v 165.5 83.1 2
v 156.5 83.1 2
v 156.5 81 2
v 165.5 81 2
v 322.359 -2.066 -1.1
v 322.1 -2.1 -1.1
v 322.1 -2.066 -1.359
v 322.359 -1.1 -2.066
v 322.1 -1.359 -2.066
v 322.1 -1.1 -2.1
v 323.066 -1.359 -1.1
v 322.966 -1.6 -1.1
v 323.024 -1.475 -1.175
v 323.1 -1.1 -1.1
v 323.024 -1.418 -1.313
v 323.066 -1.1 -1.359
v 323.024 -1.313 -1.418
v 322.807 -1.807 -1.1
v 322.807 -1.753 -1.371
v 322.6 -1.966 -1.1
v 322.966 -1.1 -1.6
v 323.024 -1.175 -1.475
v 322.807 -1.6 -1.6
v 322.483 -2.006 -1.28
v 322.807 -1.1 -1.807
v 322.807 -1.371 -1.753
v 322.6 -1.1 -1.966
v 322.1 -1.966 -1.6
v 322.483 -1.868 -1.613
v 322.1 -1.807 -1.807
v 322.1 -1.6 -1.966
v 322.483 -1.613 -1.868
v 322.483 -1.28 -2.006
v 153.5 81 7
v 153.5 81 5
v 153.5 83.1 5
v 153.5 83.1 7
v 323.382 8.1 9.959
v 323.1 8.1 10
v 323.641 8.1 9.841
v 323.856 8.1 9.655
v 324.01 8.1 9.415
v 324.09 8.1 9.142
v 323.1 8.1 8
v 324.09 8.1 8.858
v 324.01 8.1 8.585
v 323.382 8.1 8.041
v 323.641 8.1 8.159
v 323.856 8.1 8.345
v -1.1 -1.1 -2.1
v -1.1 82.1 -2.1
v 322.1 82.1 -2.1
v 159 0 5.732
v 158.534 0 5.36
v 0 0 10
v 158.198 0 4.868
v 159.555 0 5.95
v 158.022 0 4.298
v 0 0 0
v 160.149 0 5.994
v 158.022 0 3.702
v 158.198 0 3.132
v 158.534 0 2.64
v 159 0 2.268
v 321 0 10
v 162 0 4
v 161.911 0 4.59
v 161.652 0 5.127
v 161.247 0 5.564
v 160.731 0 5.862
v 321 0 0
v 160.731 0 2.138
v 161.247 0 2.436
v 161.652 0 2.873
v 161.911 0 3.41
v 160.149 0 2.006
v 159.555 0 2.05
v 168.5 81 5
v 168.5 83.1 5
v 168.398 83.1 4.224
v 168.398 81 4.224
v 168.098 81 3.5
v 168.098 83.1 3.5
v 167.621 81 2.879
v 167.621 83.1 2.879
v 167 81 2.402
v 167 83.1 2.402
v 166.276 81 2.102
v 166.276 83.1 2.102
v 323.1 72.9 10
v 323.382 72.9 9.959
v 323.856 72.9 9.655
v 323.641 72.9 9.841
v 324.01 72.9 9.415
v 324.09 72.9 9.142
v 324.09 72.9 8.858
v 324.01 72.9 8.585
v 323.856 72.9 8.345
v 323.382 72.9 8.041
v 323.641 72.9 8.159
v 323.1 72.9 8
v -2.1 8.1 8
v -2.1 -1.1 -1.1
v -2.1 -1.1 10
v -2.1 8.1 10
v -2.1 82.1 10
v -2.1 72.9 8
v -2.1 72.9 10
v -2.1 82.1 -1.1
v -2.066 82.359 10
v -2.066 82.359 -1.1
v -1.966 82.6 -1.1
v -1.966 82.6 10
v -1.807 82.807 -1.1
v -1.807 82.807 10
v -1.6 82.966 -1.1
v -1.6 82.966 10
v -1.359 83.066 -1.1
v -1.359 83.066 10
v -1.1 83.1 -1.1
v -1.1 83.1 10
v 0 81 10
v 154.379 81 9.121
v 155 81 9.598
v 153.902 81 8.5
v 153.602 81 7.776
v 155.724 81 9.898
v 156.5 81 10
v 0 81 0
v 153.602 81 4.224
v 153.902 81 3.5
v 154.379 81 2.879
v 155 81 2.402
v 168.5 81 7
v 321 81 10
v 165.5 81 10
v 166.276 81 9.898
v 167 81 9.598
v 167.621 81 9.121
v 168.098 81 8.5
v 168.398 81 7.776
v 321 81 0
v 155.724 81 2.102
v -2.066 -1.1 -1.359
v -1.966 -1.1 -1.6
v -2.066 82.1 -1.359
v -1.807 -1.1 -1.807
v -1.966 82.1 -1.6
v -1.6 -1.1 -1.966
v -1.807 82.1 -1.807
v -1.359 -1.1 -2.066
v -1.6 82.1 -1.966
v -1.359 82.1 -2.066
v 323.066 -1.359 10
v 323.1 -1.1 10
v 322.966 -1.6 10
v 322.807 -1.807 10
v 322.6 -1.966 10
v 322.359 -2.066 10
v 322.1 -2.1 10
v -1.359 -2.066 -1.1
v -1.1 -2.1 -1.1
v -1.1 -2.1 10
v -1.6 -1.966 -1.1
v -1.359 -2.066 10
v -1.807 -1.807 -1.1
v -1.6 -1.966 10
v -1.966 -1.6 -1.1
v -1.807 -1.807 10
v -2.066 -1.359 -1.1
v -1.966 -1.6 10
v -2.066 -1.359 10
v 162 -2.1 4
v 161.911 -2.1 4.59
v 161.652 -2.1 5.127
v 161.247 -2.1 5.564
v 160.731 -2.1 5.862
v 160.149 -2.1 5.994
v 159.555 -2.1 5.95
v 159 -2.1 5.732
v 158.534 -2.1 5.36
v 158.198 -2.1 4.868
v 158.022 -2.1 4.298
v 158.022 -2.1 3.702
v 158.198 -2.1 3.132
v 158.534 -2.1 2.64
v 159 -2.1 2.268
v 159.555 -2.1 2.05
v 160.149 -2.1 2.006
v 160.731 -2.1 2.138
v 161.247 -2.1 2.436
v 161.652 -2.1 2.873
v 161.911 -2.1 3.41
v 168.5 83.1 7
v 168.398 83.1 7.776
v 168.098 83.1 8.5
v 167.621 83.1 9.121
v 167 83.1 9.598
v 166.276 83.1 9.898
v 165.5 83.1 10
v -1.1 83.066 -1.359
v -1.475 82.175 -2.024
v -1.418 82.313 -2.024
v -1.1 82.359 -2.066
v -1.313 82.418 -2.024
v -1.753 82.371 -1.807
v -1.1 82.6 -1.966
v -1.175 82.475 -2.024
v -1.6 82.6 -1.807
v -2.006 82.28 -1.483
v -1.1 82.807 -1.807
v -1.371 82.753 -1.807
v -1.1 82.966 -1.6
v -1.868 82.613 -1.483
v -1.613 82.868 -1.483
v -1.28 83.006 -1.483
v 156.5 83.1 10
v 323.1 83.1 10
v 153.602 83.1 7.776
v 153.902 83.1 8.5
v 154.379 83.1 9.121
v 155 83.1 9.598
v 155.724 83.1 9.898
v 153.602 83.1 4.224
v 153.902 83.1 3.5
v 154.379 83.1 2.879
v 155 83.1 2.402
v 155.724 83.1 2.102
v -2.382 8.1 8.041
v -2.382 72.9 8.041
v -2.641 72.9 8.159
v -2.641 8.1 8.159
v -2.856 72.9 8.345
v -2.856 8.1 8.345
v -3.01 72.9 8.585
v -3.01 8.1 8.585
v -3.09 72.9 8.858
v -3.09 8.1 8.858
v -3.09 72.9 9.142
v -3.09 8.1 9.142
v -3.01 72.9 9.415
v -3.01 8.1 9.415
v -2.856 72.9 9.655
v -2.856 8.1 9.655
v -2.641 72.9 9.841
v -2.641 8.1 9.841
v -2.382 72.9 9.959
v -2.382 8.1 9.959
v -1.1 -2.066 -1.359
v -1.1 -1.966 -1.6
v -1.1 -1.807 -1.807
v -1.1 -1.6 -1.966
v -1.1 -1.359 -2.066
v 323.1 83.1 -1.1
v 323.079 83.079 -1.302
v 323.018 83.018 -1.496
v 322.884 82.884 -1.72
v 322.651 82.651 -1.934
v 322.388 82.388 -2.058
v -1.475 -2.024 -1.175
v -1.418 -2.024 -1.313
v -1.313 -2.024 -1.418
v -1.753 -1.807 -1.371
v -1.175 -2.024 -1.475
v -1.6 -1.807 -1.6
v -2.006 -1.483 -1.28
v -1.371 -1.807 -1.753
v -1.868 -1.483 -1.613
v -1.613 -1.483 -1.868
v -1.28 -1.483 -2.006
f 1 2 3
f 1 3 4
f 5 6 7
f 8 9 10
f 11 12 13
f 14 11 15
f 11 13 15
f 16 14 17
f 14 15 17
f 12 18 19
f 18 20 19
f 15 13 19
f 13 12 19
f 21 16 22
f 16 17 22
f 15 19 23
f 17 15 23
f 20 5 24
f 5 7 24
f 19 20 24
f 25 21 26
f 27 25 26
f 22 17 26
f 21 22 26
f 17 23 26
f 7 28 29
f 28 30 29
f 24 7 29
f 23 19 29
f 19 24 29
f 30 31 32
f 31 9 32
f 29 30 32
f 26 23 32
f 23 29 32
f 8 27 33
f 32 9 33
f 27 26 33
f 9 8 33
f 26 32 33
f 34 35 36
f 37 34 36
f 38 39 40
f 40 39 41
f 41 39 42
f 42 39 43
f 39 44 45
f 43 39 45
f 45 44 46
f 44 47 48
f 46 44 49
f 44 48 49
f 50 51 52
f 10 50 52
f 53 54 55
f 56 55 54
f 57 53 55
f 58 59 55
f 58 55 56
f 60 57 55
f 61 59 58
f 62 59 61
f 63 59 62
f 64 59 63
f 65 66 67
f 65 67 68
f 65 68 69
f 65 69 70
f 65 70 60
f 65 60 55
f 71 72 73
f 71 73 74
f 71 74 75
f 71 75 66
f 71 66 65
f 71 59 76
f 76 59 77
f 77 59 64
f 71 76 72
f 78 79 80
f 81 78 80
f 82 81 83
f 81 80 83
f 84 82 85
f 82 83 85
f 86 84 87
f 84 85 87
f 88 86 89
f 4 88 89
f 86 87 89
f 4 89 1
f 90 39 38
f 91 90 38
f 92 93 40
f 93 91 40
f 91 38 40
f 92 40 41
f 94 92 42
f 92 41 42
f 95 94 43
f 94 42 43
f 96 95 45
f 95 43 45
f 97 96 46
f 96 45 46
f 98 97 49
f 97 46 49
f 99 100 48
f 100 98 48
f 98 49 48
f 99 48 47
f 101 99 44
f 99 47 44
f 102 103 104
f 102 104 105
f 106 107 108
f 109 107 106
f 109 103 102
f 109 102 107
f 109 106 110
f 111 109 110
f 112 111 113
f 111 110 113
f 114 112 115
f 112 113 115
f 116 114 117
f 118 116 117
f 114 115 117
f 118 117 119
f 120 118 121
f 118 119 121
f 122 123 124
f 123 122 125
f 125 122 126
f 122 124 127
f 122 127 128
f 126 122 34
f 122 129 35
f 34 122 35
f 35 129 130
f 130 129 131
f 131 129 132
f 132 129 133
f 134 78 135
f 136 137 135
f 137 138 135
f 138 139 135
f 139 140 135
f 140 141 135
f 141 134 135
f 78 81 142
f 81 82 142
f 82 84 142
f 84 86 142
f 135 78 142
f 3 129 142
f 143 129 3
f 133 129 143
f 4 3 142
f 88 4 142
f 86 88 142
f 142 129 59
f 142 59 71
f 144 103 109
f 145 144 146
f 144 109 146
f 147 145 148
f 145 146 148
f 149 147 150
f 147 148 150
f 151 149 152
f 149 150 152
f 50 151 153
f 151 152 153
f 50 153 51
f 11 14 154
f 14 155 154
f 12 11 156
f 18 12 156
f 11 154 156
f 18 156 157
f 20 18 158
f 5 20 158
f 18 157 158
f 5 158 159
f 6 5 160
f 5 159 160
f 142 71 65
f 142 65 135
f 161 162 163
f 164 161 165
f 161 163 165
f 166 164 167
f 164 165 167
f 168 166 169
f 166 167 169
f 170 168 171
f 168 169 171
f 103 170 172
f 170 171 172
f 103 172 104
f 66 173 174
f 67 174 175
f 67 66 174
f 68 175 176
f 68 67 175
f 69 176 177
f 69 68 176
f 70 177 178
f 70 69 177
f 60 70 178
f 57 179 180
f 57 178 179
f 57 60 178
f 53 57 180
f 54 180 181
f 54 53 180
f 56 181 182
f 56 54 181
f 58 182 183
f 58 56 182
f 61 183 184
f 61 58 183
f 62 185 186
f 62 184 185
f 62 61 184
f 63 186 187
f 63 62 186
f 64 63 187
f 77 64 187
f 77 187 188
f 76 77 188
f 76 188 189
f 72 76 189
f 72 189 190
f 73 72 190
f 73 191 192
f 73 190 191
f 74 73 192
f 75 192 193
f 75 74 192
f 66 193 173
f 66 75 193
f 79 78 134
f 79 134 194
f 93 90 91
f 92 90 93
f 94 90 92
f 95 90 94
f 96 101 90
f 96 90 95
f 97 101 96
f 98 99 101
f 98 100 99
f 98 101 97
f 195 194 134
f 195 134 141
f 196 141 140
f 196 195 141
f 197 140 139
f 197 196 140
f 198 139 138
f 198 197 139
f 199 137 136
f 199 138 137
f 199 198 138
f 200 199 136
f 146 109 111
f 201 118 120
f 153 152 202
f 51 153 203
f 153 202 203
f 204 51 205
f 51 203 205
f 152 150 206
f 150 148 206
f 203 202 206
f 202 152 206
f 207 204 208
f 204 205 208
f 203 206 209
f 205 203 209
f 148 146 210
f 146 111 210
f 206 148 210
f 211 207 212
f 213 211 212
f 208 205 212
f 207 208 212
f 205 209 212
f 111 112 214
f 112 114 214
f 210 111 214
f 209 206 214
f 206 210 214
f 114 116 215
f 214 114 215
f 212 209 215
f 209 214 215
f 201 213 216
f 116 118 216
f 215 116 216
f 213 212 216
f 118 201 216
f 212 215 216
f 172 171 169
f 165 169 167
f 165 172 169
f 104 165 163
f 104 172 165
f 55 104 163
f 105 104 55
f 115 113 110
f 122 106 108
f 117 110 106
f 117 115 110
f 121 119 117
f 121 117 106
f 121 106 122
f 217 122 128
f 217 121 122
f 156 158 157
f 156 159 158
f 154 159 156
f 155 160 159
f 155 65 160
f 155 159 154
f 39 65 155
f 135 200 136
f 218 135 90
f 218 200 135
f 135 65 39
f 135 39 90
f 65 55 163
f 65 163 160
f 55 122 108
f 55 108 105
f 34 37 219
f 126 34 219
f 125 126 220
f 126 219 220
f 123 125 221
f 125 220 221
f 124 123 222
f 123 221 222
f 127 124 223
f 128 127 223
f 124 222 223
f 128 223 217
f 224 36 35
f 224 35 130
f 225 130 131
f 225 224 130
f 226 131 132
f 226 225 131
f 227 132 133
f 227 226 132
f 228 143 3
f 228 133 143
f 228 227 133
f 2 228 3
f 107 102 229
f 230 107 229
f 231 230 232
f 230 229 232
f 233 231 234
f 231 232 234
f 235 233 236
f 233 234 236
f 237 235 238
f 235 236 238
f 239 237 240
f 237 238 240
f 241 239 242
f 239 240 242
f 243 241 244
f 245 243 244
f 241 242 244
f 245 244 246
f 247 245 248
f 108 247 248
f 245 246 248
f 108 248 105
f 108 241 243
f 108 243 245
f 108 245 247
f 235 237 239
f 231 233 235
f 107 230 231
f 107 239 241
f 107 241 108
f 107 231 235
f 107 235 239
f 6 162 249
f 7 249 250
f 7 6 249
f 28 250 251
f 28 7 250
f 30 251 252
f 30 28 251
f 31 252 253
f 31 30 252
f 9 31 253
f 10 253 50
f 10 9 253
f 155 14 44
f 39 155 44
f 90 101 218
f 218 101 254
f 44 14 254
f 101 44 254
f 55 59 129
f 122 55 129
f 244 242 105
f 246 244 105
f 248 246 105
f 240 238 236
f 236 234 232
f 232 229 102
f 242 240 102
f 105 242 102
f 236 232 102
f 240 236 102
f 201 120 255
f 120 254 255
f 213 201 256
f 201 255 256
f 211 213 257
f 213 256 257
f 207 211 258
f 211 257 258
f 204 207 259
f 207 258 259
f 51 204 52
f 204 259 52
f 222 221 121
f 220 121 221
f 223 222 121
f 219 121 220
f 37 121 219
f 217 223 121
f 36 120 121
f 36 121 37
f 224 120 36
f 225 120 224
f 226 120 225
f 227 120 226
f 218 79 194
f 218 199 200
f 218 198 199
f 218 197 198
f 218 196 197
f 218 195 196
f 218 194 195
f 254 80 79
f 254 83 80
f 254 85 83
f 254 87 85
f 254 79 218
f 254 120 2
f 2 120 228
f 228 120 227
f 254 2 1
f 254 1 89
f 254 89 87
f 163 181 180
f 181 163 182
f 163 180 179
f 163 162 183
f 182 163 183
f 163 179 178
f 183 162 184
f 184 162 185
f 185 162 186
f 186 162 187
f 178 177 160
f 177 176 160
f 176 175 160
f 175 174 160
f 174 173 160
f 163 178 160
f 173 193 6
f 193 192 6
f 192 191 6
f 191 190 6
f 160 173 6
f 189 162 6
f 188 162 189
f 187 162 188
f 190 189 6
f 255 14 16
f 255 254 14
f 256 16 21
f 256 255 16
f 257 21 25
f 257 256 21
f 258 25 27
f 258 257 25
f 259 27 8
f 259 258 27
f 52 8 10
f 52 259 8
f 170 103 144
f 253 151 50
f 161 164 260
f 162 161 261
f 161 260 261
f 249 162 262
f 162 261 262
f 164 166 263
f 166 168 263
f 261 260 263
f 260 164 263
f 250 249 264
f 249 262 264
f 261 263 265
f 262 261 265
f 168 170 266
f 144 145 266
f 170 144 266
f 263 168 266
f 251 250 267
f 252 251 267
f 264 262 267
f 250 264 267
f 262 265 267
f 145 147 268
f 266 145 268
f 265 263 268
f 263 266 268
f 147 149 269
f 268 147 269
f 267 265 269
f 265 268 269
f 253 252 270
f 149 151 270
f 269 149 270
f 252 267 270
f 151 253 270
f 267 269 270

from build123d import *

# Parameters (mm, degrees)
CYLINDER_R         = 2
CYLINDER_DEPTH     = 10
BOX002_W           = 15
BOX002_H           = 10
BOX002_DEPTH       = 8
FILLET003_R        = 3
TONGUE_LEFT_R      = 1
TONGUE_LEFT_DEPTH  = 64.8
TONGUE_RIGHT_R     = 1
TONGUE_RIGHT_DEPTH = 64.8
CASE_INSIDE_W      = 321
CASE_INSIDE_H      = 81
CASE_INSIDE_DEPTH  = 10
CASE_OUTSIDE_W     = 325.2
CASE_OUTSIDE_H     = 85.2
CASE_OUTSIDE_DEPTH = 12.1
FILLET_R           = 1


with BuildPart() as cylinder:
    # Cylinder → Cylinder (new body)
    with BuildSketch(Plane(origin=(160, 0, 4), x_dir=(1, 0, 0), z_dir=(0, -1, 0))):
        Circle(CYLINDER_R)
    extrude(amount=CYLINDER_DEPTH)


with BuildPart() as fillet003:
    # Box002 → Box002 (new body)
    with BuildSketch(Plane(origin=(153.5, 80, 2), x_dir=(1, 0, 0), z_dir=(0, 0, 1))):
        with Locations((7.5, 5)):
            Rectangle(BOX002_W, BOX002_H)
    extrude(amount=BOX002_DEPTH)

    # Fillet003
    fillet003_edges = [fillet003.edges().sort_by_distance(p)[0] for p in [
        (153.5, 85, 10),
        (153.5, 85, 2),
        (168.5, 85, 10),
        (168.5, 85, 2),
    ]]
    fillet(fillet003_edges, radius=FILLET003_R)


with BuildPart() as tongue_left:
    # tongue_left → tongue_left (new body)
    with BuildSketch(Plane(origin=(-2.1, 8.1, 9), x_dir=(1, 0, 0), z_dir=(0, 1, 0))):
        Circle(TONGUE_LEFT_R)
    extrude(amount=TONGUE_LEFT_DEPTH)


with BuildPart() as tongue_right:
    # tongue_right → tongue_right (new body)
    with BuildSketch(Plane(origin=(323.1, 8.1, 9), x_dir=(1, 0, 0), z_dir=(0, 1, 0))):
        Circle(TONGUE_RIGHT_R)
    extrude(amount=TONGUE_RIGHT_DEPTH)


with BuildPart() as case_inside:
    # case_inside → case_inside (new body)
    with BuildSketch(Plane.XY):
        with Locations((160.5, 40.5)):
            Rectangle(CASE_INSIDE_W, CASE_INSIDE_H)
    extrude(amount=CASE_INSIDE_DEPTH)


with BuildPart() as case002:
    # case_outside → case_outside (new body)
    with BuildSketch(Plane(origin=(-2.1, -2.1, -2.1), x_dir=(1, 0, 0), z_dir=(0, 0, 1))):
        with Locations((162.6, 42.6)):
            Rectangle(CASE_OUTSIDE_W, CASE_OUTSIDE_H)
    extrude(amount=CASE_OUTSIDE_DEPTH)

    # Cut: cut case_inside
    add(case_inside.part, mode=Mode.SUBTRACT)

    # Fusion: union tongue_left, tongue_right
    add(tongue_left.part)
    add(tongue_right.part)

    # Fillet
    fillet_edges = [case002.edges().sort_by_distance(p)[0] for p in [
        (-2.1, 83.1, 3.95),
        (-2.1, 40.5, -2.1),
        (-2.1, -2.1, 3.95),
        (160.5, 83.1, -2.1),
        (160.5, -2.1, -2.1),
        (323.1, -2.1, 3.95),
        (323.1, 40.5, -2.1),
    ]]
    fillet(fillet_edges, radius=FILLET_R)

    # Cut005: cut Fillet003
    add(fillet003.part, mode=Mode.SUBTRACT)

    # Cut006: cut Cylinder
    add(cylinder.part, mode=Mode.SUBTRACT)


solid = case002.part
